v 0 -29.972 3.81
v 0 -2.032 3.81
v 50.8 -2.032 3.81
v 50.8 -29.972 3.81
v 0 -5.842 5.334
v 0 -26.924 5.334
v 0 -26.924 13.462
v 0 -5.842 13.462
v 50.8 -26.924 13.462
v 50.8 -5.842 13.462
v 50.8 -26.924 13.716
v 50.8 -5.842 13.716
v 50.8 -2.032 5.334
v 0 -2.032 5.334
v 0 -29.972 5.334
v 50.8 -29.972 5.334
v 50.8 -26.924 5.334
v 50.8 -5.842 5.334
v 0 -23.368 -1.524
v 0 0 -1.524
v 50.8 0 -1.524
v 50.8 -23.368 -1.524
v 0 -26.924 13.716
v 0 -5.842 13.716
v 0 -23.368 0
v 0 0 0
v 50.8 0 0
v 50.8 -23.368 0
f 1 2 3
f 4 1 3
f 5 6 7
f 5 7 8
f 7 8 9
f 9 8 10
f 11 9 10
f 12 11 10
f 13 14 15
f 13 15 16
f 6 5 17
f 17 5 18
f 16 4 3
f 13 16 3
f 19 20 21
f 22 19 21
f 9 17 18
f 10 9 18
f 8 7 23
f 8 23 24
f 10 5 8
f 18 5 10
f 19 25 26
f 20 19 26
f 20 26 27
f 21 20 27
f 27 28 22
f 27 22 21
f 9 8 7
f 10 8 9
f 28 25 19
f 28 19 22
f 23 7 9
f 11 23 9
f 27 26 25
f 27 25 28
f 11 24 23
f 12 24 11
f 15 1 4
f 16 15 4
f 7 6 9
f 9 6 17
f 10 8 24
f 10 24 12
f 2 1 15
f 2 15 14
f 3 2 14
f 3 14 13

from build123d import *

# Parameters (mm, degrees)
F0_W     = 50.8
F0_H     = 23.368
F1_DEPTH = 1.524
F3_W     = 50.8
F3_H     = 27.94
F4_DEPTH = 1.524
F6_W     = 50.8
F6_H     = 21.082
F7_DEPTH = 8.128
F8_W     = 50.8
F8_H     = 21.082
F9_DEPTH = 0.254


with BuildPart() as f1:
    # F0 (on Top) → F1 (new body)
    with BuildSketch(Plane.XY):
        with Locations((25.4, -11.684)):
            Rectangle(F0_W, F0_H)
    extrude(amount=-F1_DEPTH)


with BuildPart() as f4:
    # F3 (on offset) → F4 (new body)
    with BuildSketch(Plane.XY.offset(3.81)):
        with Locations((25.4, -16.002)):
            Rectangle(F3_W, F3_H)
    extrude(amount=F4_DEPTH)


with BuildPart() as f7:
    # F6 (on offset) → F7 (new body)
    with BuildSketch(Plane.XY.offset(5.334)):
        with Locations((25.4, -16.383)):
            Rectangle(F6_W, F6_H)
    extrude(amount=F7_DEPTH)


with BuildPart() as f9:
    # F8 (on face) → F9 (new body)
    with BuildSketch(Plane.XY.offset(13.462)):
        with Locations((25.4, -16.383)):
            Rectangle(F8_W, F8_H)
    extrude(amount=F9_DEPTH)


solid = Compound([f1.part, f4.part, f7.part, f9.part])
